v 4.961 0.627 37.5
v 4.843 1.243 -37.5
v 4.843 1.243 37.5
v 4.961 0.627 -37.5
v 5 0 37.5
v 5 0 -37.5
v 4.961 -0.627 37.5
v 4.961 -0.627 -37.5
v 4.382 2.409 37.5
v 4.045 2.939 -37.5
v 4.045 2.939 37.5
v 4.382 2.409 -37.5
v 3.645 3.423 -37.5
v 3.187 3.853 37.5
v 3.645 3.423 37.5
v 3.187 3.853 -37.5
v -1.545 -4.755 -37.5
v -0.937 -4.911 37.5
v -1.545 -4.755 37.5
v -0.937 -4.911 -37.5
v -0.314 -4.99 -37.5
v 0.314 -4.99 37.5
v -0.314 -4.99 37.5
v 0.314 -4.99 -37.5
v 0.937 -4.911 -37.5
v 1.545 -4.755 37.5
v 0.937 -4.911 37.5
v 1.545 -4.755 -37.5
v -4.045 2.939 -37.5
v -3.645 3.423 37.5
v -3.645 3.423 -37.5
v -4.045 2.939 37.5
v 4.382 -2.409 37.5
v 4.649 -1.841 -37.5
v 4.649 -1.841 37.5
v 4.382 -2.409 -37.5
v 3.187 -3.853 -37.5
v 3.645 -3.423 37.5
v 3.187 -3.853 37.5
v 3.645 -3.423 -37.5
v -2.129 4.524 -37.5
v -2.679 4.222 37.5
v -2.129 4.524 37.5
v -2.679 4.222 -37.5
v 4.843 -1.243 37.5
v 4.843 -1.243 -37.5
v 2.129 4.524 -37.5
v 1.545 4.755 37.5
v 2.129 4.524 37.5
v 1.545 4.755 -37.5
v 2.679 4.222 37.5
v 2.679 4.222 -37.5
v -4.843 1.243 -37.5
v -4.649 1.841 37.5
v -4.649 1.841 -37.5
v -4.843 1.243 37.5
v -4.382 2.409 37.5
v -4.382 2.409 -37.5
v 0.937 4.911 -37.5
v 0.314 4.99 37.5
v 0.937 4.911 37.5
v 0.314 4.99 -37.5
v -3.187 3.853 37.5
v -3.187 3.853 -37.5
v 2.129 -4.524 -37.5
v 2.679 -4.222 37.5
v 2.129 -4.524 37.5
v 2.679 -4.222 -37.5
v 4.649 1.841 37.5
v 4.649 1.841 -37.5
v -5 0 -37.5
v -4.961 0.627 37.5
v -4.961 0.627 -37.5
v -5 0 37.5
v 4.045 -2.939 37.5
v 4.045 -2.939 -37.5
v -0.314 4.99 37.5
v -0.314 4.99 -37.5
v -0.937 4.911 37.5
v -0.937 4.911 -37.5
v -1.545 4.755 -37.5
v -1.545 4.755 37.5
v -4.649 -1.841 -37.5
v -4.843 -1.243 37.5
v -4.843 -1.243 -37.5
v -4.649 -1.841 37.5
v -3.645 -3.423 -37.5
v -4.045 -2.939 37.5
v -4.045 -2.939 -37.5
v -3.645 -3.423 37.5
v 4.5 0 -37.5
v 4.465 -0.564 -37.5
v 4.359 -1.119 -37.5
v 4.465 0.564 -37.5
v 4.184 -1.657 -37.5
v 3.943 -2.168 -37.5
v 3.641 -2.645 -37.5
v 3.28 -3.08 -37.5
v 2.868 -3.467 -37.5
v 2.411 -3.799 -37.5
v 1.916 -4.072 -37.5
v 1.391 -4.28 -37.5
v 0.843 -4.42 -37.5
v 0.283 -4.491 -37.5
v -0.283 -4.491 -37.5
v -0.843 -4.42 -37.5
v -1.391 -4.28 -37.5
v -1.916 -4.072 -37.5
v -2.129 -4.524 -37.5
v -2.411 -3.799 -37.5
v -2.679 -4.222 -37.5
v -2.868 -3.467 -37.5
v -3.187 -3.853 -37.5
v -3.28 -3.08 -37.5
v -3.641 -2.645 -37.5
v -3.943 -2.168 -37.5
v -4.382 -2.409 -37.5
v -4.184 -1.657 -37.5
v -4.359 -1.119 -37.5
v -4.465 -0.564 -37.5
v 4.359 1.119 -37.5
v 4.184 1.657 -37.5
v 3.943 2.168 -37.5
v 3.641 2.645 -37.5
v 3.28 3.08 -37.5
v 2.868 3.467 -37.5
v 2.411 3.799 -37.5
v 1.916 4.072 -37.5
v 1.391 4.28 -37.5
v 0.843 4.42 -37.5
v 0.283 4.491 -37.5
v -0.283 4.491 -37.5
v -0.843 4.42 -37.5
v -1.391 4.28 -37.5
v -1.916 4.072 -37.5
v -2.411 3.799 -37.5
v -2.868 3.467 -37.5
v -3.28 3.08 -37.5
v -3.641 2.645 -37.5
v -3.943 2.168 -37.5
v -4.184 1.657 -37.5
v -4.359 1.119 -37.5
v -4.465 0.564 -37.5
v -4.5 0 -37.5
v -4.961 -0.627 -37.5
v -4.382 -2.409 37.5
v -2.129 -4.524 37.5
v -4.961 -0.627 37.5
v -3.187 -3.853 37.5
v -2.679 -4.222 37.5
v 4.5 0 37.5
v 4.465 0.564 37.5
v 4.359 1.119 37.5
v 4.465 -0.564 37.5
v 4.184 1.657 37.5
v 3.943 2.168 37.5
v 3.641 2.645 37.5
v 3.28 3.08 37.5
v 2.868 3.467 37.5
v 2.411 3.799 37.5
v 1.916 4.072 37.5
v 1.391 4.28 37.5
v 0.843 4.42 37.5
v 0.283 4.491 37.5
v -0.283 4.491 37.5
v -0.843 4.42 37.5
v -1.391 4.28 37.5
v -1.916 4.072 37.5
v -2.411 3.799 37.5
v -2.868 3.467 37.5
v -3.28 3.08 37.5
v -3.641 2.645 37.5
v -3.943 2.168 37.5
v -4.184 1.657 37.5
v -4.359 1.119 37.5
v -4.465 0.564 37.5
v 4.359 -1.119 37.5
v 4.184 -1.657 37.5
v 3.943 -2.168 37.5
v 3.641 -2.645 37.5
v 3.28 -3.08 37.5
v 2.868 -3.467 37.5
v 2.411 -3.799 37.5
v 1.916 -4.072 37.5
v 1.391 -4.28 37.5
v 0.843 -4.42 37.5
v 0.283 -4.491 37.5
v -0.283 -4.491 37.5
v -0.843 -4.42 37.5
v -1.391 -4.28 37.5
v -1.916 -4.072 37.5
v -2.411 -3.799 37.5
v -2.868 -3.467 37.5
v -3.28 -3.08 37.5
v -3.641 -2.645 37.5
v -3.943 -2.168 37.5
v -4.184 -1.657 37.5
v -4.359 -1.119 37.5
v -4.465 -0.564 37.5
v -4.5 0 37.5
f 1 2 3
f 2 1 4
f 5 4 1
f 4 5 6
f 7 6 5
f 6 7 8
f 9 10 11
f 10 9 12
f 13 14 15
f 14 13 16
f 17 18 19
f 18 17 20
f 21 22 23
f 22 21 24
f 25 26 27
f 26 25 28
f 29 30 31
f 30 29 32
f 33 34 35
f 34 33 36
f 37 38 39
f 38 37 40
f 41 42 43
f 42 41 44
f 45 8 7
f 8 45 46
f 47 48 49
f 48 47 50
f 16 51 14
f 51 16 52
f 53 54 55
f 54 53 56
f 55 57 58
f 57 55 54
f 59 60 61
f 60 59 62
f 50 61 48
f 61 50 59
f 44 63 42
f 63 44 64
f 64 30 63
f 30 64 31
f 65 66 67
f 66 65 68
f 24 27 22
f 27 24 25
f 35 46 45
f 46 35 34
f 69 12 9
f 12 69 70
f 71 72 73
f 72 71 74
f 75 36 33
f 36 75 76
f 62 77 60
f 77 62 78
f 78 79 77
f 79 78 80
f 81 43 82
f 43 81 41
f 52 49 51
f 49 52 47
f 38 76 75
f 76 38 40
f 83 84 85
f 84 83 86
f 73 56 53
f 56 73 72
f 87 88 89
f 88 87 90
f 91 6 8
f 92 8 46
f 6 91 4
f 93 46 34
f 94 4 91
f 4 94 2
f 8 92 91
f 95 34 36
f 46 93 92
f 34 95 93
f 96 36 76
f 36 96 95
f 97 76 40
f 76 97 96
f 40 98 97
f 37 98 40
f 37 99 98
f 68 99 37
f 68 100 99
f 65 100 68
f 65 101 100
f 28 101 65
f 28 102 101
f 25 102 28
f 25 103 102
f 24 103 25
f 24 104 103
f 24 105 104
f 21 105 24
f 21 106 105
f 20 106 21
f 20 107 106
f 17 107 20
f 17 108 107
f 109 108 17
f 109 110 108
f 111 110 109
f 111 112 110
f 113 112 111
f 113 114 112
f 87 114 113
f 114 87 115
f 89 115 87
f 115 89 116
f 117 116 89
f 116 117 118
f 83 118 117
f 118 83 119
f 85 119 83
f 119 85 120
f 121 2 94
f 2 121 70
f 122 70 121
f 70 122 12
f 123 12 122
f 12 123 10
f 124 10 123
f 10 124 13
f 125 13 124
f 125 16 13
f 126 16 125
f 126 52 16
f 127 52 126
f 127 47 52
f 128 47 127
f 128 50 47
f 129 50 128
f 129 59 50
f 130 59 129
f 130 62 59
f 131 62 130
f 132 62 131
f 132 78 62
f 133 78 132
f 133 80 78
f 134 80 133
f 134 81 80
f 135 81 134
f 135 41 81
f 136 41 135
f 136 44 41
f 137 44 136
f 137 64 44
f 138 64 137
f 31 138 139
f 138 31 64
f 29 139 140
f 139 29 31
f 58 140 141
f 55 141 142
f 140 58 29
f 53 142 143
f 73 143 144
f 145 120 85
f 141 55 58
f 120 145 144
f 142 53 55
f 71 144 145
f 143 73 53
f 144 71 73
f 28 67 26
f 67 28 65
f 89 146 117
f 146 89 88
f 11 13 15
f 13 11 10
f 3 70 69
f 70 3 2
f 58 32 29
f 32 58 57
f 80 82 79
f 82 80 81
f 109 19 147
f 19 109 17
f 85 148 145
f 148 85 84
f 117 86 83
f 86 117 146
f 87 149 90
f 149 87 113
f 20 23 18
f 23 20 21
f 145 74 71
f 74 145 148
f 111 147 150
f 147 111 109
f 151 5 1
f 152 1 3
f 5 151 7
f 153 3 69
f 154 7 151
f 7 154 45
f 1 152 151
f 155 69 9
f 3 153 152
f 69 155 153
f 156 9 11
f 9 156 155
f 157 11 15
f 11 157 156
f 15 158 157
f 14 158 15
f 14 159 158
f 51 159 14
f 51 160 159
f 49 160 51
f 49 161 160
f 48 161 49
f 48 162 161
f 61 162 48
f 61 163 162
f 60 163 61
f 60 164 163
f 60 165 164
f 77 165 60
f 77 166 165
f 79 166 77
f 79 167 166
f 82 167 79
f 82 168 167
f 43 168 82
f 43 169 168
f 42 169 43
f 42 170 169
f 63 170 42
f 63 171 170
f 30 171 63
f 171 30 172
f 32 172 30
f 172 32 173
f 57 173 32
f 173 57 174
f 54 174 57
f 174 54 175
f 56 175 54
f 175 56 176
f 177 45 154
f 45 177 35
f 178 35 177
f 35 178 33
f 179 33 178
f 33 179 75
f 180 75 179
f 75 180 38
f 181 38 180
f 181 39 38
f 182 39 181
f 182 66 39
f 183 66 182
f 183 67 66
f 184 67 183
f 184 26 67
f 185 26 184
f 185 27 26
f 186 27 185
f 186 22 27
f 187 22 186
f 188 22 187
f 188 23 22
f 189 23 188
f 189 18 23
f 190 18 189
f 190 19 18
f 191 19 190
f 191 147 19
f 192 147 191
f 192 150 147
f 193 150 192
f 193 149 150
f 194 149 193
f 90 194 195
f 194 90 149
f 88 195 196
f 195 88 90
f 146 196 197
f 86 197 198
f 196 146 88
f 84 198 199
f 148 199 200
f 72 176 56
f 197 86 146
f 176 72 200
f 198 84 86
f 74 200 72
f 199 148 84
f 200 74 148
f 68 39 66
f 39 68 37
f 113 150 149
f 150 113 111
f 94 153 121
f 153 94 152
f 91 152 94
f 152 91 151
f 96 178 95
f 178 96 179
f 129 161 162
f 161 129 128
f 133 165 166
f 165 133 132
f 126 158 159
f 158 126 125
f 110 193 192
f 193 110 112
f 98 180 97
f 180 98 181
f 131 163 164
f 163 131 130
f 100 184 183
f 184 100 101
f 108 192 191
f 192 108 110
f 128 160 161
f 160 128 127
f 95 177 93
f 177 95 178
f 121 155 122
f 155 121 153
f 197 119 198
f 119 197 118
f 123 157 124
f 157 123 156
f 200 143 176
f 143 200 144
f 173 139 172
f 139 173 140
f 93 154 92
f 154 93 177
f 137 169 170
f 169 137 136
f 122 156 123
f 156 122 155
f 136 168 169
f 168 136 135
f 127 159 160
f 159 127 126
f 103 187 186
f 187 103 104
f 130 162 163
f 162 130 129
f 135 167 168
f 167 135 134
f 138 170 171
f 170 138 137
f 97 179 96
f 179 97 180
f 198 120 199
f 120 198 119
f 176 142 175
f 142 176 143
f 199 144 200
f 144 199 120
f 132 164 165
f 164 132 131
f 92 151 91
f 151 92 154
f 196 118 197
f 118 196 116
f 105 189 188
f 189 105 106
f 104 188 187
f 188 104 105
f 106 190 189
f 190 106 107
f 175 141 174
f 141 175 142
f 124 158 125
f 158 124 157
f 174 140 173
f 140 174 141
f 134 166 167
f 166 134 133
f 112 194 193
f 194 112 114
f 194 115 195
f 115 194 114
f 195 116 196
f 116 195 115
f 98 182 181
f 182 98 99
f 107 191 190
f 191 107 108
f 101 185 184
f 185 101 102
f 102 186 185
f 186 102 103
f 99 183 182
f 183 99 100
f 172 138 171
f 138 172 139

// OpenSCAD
$fn = 50;


difference() {
	union() {
		translate(v = [0, 0, -37.5000000000]) {
			cylinder(h = 75, r = 5.0000000000);
		}
	}
	union() {
		translate(v = [0, 0, -100.0000000000]) {
			cylinder(h = 200, r = 4.5000000000);
		}
	}
}
